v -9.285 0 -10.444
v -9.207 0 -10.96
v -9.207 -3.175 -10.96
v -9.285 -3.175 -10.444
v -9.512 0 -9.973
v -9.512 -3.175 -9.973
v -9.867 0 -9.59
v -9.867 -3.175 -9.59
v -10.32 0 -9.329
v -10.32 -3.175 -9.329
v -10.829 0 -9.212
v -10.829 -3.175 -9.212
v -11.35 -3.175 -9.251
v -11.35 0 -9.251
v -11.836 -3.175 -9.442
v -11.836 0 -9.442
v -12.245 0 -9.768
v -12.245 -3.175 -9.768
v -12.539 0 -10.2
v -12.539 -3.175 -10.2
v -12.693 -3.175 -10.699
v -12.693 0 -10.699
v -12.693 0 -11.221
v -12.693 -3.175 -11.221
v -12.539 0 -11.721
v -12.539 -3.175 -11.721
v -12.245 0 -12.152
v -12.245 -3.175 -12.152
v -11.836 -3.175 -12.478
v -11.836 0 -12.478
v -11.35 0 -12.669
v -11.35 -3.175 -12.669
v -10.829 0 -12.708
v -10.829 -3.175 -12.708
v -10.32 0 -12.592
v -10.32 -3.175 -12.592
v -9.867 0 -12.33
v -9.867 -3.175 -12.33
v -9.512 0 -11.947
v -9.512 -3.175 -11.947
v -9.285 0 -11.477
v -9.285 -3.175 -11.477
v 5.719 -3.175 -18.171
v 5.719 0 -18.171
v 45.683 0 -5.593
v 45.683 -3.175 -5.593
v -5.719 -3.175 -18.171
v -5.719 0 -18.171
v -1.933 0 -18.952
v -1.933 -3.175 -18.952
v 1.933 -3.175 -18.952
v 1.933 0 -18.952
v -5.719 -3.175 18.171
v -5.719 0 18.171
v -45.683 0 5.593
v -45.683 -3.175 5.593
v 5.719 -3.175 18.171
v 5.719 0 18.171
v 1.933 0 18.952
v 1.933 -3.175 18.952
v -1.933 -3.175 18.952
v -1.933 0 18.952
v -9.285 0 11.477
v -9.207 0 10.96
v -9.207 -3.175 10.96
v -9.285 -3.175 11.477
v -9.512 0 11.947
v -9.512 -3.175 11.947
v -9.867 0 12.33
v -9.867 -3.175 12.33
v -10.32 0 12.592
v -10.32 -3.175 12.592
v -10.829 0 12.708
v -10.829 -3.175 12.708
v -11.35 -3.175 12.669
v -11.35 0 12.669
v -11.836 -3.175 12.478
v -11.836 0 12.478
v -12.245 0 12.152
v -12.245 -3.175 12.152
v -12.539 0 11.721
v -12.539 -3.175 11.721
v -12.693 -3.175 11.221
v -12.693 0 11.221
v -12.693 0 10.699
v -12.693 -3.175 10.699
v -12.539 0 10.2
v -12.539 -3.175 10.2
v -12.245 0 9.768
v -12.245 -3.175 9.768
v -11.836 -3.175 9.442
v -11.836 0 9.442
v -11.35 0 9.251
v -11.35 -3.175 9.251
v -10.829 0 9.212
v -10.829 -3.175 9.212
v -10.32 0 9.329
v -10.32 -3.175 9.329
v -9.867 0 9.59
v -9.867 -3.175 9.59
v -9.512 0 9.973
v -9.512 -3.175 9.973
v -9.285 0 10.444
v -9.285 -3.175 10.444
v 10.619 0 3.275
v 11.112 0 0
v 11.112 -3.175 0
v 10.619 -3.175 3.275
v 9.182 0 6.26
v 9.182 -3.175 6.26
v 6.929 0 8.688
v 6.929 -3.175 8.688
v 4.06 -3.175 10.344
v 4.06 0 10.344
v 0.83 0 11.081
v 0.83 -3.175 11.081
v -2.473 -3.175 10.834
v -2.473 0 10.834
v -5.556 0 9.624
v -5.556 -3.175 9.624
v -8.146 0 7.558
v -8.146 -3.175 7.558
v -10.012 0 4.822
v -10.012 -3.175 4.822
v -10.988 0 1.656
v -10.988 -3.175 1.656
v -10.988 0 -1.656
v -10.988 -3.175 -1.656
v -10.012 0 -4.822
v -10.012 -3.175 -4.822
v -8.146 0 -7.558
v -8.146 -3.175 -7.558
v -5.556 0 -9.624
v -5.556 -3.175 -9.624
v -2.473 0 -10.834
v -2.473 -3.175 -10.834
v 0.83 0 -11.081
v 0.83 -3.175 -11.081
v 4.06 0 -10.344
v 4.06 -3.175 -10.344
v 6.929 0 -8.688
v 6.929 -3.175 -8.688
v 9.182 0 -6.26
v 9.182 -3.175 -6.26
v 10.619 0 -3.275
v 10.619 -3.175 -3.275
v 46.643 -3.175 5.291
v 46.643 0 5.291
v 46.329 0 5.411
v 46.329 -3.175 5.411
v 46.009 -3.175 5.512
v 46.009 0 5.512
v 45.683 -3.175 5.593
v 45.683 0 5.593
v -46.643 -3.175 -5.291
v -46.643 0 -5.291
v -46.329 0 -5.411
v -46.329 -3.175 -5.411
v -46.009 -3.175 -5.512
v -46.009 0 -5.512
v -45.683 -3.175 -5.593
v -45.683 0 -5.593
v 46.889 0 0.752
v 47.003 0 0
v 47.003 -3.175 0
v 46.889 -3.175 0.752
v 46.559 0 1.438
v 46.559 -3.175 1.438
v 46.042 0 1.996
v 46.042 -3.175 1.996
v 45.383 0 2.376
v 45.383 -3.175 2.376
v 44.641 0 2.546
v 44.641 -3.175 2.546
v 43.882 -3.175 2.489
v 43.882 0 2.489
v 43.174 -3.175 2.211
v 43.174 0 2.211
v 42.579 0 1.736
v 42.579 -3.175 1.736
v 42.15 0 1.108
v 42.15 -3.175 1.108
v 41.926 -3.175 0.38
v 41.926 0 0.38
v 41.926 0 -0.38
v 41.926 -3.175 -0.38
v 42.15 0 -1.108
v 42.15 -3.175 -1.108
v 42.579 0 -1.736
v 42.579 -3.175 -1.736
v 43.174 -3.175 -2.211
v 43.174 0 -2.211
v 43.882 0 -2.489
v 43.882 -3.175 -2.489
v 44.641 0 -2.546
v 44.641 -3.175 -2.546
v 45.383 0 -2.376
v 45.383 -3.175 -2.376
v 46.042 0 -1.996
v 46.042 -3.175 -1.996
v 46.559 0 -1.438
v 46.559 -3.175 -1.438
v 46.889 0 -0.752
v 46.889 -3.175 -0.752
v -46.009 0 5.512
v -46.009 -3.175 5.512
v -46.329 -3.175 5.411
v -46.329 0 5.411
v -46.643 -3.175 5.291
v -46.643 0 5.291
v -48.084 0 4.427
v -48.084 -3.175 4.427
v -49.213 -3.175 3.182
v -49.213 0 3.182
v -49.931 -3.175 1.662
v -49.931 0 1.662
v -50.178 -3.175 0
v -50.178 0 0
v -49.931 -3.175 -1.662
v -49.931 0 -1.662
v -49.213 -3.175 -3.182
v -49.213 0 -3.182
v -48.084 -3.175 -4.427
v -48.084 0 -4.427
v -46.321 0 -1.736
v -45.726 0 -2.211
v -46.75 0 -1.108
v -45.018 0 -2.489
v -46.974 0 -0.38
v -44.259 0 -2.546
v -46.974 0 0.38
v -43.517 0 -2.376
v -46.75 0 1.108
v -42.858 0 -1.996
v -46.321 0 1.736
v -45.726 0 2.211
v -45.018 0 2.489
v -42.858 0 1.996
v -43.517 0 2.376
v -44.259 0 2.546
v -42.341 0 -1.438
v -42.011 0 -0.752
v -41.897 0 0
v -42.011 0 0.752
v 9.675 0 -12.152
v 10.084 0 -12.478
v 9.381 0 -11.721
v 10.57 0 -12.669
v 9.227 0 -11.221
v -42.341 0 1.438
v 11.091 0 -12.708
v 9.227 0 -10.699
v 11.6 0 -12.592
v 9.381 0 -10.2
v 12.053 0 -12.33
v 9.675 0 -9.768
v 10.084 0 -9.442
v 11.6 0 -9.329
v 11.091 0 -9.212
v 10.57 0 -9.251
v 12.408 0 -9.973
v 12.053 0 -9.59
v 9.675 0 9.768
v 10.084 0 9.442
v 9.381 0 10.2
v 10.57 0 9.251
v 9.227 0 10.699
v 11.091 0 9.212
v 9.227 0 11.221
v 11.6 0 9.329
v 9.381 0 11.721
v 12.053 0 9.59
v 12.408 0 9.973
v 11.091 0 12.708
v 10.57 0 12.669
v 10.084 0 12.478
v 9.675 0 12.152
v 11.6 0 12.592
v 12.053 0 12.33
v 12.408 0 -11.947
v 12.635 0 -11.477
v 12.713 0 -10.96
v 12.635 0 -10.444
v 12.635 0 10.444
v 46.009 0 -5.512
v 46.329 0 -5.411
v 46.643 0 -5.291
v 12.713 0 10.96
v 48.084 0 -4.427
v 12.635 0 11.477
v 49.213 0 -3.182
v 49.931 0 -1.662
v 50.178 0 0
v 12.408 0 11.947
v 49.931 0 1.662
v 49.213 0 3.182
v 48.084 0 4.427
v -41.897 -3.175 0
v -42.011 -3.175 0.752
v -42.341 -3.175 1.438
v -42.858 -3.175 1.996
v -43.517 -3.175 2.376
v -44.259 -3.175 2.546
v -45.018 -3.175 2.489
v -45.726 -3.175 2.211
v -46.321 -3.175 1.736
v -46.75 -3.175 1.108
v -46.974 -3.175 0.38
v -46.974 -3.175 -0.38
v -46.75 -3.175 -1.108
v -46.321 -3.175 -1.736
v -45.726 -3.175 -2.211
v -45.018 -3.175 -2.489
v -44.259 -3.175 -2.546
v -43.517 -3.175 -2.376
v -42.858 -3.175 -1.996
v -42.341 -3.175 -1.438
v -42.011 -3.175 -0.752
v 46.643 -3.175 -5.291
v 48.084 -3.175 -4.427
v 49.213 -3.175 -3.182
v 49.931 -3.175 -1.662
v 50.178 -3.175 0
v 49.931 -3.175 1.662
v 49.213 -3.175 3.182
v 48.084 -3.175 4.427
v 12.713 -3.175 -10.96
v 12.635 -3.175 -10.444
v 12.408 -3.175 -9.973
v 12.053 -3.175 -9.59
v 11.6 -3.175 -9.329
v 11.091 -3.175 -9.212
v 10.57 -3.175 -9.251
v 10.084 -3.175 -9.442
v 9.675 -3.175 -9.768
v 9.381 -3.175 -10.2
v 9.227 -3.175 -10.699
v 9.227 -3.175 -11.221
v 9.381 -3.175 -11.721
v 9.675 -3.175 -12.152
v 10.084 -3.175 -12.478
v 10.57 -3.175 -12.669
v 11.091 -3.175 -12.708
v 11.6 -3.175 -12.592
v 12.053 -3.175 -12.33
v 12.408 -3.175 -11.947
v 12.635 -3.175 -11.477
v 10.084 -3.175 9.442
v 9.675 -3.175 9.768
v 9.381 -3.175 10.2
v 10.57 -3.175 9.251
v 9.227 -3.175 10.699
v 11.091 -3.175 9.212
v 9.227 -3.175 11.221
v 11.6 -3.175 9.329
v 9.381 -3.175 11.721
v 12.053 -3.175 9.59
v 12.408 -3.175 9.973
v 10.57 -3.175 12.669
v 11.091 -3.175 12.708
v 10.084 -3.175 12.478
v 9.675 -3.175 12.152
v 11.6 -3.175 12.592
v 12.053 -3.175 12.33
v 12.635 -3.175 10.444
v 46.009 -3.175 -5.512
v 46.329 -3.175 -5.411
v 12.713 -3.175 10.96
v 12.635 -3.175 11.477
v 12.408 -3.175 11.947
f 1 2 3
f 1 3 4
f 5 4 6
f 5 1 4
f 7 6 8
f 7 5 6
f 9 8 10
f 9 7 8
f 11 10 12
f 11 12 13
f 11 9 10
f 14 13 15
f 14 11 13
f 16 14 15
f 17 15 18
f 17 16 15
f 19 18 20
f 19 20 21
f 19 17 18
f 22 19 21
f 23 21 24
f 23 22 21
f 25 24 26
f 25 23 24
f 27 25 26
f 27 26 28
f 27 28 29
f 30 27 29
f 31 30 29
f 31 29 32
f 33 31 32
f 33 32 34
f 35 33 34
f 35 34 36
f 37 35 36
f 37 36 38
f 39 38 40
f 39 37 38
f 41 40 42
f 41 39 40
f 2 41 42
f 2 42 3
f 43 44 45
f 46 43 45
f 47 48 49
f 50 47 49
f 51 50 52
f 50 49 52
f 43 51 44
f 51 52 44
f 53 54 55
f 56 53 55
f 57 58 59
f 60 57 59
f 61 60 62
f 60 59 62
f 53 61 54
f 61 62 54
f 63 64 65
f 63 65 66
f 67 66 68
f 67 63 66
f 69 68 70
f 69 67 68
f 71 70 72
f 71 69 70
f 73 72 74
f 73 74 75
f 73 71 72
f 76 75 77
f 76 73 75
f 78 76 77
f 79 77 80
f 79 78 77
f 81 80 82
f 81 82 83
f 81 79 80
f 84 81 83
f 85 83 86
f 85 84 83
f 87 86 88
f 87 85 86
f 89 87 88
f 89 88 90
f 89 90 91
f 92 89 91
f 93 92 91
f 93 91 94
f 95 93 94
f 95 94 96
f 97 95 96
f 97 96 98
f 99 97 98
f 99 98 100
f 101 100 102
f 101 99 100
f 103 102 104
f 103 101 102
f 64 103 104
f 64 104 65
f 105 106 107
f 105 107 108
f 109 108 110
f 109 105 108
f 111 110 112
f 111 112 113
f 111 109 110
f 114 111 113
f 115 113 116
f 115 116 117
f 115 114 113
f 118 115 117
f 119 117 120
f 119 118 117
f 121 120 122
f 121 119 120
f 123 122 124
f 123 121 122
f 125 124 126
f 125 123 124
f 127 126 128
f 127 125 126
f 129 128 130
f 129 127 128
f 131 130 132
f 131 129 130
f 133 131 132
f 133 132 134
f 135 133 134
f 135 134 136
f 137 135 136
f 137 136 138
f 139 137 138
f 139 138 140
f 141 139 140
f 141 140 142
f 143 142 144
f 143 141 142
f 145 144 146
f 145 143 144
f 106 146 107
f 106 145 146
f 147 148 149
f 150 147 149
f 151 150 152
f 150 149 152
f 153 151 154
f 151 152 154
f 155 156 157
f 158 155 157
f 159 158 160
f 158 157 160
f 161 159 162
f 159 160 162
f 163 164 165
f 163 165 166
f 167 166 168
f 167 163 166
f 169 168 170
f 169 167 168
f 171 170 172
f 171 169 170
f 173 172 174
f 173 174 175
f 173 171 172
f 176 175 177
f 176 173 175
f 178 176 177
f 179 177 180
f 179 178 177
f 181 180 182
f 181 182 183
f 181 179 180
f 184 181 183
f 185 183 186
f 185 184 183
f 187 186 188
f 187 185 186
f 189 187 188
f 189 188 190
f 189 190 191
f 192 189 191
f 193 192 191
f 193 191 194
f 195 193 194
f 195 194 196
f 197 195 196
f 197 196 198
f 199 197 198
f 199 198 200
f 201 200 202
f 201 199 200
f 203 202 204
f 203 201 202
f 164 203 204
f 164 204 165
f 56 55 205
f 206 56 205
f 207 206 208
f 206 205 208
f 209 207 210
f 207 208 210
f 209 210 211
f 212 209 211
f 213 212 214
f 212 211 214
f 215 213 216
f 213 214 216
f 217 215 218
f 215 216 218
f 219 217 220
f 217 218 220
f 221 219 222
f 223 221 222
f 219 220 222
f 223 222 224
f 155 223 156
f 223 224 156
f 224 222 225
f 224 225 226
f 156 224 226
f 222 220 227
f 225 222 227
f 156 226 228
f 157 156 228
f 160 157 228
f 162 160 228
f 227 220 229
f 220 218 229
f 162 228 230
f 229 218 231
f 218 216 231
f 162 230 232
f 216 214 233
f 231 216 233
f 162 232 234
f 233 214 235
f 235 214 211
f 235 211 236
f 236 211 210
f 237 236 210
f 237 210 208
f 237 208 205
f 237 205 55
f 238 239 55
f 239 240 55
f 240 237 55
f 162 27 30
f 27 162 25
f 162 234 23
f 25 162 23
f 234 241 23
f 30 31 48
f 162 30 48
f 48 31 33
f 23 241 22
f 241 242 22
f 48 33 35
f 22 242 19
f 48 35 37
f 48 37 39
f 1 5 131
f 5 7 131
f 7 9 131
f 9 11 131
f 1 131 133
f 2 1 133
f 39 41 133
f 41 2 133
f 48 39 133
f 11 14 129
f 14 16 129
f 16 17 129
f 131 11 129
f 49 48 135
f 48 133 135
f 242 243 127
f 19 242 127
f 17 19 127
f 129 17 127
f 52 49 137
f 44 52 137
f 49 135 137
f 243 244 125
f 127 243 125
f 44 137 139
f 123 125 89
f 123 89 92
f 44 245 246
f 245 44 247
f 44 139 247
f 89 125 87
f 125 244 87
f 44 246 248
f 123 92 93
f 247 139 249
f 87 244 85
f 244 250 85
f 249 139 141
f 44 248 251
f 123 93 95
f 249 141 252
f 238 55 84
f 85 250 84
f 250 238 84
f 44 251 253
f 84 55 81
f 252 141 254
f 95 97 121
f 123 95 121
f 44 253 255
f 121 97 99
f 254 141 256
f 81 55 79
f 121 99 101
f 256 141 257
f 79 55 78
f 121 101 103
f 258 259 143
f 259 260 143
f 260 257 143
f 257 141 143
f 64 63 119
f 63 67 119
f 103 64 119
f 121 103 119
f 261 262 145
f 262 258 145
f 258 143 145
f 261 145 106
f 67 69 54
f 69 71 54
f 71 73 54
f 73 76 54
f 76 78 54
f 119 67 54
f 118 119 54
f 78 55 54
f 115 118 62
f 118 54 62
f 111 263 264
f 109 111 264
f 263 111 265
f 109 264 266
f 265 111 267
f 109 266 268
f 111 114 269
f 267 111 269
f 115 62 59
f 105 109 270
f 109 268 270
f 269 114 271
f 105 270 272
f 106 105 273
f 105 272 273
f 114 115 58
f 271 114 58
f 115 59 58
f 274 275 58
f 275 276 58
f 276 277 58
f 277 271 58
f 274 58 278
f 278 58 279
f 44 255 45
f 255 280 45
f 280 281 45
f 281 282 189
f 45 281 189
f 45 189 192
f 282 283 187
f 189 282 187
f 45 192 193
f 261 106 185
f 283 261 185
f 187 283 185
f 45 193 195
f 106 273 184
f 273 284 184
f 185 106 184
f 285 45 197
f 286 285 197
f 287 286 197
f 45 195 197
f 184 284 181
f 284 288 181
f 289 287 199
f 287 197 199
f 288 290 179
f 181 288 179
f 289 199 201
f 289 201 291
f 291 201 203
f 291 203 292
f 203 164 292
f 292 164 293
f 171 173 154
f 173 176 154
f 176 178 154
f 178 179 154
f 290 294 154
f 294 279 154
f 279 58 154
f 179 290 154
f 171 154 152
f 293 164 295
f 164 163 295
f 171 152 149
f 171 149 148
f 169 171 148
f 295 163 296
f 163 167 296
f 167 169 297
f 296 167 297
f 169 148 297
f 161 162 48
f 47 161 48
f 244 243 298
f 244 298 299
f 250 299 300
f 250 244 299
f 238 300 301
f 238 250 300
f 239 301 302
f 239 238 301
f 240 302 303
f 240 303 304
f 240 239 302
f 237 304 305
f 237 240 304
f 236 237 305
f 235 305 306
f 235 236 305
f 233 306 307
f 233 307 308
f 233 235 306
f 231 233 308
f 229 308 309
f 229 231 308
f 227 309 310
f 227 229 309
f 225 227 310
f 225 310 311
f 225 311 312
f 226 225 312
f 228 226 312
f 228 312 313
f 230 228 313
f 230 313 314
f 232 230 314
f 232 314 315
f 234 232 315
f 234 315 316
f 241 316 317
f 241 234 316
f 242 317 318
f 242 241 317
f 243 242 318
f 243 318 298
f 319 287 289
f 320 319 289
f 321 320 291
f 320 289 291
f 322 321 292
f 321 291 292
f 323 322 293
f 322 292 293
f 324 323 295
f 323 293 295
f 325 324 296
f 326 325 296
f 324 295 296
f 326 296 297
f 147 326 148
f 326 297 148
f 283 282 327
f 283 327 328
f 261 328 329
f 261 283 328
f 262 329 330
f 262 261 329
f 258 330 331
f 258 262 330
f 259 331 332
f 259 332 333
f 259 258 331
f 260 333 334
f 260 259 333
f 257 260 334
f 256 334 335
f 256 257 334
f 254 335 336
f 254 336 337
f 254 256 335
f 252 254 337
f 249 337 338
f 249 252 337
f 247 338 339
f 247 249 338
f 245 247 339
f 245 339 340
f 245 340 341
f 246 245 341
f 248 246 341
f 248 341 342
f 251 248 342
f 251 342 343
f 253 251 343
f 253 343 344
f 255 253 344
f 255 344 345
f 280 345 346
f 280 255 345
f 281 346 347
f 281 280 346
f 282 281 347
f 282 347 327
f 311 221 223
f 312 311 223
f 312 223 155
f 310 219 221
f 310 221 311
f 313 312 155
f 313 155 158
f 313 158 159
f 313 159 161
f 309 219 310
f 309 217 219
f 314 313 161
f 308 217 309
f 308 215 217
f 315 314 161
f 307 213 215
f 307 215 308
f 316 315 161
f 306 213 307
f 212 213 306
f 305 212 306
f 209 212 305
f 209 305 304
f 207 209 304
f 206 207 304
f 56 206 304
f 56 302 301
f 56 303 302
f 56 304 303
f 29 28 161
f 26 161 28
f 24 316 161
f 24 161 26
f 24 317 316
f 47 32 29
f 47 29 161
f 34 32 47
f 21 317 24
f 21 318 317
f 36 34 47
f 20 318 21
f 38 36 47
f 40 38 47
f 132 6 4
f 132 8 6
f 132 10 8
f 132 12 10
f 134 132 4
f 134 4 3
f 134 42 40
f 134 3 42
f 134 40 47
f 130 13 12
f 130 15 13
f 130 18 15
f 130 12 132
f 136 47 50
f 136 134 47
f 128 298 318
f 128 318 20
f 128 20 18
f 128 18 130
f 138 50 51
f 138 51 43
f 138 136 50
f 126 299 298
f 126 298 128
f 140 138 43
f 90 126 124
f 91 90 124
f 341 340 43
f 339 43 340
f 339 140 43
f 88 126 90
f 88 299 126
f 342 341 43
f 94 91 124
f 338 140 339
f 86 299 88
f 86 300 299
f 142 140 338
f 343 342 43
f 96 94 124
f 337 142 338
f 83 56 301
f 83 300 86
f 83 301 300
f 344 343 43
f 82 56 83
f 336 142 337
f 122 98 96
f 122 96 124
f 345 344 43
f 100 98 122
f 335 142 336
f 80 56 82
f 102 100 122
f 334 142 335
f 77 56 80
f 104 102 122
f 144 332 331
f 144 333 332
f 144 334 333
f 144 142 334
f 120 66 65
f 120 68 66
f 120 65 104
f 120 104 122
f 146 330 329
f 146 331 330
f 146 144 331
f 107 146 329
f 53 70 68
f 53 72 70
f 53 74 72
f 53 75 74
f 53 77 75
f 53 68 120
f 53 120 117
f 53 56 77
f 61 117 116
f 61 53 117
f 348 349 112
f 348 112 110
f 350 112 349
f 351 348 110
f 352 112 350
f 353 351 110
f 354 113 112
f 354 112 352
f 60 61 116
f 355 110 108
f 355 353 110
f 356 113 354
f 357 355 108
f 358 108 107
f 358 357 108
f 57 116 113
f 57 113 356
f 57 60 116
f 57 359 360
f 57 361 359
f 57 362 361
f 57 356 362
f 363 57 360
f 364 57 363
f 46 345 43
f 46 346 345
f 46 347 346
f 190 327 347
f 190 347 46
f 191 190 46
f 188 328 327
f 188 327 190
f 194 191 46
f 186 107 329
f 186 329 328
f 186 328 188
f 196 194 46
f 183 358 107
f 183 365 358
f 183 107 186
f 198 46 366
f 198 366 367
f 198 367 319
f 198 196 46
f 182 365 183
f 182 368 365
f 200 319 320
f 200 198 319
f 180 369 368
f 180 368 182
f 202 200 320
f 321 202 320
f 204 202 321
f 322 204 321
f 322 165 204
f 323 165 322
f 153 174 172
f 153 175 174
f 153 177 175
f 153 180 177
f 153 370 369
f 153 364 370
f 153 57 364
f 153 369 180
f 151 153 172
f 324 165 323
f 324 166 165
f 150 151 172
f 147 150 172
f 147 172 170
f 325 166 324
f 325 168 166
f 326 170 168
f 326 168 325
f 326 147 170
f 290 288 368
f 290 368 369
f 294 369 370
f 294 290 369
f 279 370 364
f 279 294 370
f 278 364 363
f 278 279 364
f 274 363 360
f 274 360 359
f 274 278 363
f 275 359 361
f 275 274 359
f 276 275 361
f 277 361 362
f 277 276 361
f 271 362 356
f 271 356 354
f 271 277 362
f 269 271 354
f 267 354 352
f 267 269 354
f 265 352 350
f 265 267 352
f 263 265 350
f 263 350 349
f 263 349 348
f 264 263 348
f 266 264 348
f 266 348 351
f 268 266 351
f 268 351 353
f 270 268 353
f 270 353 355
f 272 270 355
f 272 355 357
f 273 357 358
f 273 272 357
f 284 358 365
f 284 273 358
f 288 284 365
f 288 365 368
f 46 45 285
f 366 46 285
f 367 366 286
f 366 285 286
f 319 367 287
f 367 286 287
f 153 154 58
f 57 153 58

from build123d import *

# Parameters (mm, degrees)
F0_R     = 1.7526
F0_R_2   = 2.5527
F0_R_3   = 11.1125
F1_DEPTH = 3.175


with BuildPart() as f1:
    # F0 (on Front) → F1 (new body)
    with BuildSketch(Plane.XZ):
        with BuildLine():
            Line((-46.642908, 5.291286), (-45.682848, 5.593446))
            ThreePointArc((-45.682848, 5.593446), (-46.169528, 5.463494), (-46.642908, 5.291286))
        make_face()
        with BuildLine():
            Line((-5.71905, 18.171268), (-45.682848, 5.593446))
            Line((-45.682848, 5.593446), (-46.642908, 5.291286))
            ThreePointArc((-46.642908, 5.291286), (-50.1777, 0), (-46.642908, -5.291286))
            Line((-46.642908, -5.291286), (-45.682848, -5.593446))
            Line((-45.682848, -5.593446), (-5.71905, -18.171268))
            ThreePointArc((-5.71905, -18.171268), (0, -19.05), (5.71905, -18.171268))
            Line((5.71905, -18.171268), (45.682848, -5.593446))
            Line((45.682848, -5.593446), (46.642908, -5.291286))
            ThreePointArc((46.642908, -5.291286), (50.1777, 0), (46.642908, 5.291286))
            Line((46.642908, 5.291286), (45.682848, 5.593446))
            Line((45.682848, 5.593446), (5.71905, 18.171268))
            ThreePointArc((5.71905, 18.171268), (0, 19.05), (-5.71905, 18.171268))
        make_face()
        with Locations((-10.960097, -10.960097)):
            Circle(F0_R, mode=Mode.SUBTRACT)
        with Locations((-44.45, 0)):
            Circle(F0_R_2, mode=Mode.SUBTRACT)
        with Locations((10.960097, -10.960097)):
            Circle(F0_R, mode=Mode.SUBTRACT)
        Circle(F0_R_3, mode=Mode.SUBTRACT)
        with Locations((44.45, 0)):
            Circle(F0_R_2, mode=Mode.SUBTRACT)
        with Locations((-10.960097, 10.960097)):
            Circle(F0_R, mode=Mode.SUBTRACT)
        with Locations((10.960097, 10.960097)):
            Circle(F0_R, mode=Mode.SUBTRACT)
        with BuildLine():
            Line((-45.682848, -5.593446), (-46.642908, -5.291286))
            ThreePointArc((-46.642908, -5.291286), (-46.169528, -5.463494), (-45.682848, -5.593446))
        make_face()
        with BuildLine():
            ThreePointArc((46.642908, 5.291286), (46.169528, 5.463494), (45.682848, 5.593446))
            Line((45.682848, 5.593446), (46.642908, 5.291286))
        make_face()
        with BuildLine():
            ThreePointArc((45.682848, -5.593446), (46.169528, -5.463494), (46.642908, -5.291286))
            Line((46.642908, -5.291286), (45.682848, -5.593446))
        make_face()
    extrude(amount=F1_DEPTH)


solid = f1.part
